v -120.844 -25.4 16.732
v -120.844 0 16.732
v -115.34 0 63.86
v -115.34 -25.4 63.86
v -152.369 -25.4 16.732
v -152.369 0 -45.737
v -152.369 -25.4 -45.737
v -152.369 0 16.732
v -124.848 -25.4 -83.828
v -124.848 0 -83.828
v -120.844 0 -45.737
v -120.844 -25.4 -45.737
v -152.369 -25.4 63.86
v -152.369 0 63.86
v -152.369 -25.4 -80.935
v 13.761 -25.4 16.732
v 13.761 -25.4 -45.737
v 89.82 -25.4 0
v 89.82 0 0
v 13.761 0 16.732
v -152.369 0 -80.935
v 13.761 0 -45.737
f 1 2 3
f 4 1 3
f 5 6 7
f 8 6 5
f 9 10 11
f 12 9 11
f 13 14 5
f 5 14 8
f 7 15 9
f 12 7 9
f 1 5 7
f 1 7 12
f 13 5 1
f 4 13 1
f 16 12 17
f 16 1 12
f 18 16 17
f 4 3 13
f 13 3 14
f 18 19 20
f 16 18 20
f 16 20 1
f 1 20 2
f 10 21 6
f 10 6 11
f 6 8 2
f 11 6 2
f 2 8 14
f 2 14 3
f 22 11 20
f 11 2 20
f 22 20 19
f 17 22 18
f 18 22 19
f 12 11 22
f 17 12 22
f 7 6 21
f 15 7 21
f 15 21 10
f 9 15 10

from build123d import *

# Parameters (mm, degrees)
F0_W     = 31.524651
F0_H     = 62.468918
F0_W_2   = 134.60525
F1_DEPTH = 25.4


with BuildPart() as f1:
    # F0 (on Front) → F1 (new body)
    with BuildSketch(Plane.XZ):
        with Locations((-136.606816, -14.502092)):
            Rectangle(F0_W, F0_H)
        Polygon((-120.844491, -45.736551), (-152.369142, -45.736551), (-152.369142, -80.935445), (-124.847621, -83.827771), align=None)
        with Locations((-53.541866, -14.502092)):
            Rectangle(F0_W_2, F0_H)
        Polygon((-152.369142, 63.859507), (-152.369142, 16.732367), (-120.844491, 16.732367), (-115.340188, 63.859507), align=None)
        Polygon((13.760759, 16.732367), (13.760759, -45.736551), (89.820236, 0), align=None)
    extrude(amount=F1_DEPTH)


solid = f1.part
